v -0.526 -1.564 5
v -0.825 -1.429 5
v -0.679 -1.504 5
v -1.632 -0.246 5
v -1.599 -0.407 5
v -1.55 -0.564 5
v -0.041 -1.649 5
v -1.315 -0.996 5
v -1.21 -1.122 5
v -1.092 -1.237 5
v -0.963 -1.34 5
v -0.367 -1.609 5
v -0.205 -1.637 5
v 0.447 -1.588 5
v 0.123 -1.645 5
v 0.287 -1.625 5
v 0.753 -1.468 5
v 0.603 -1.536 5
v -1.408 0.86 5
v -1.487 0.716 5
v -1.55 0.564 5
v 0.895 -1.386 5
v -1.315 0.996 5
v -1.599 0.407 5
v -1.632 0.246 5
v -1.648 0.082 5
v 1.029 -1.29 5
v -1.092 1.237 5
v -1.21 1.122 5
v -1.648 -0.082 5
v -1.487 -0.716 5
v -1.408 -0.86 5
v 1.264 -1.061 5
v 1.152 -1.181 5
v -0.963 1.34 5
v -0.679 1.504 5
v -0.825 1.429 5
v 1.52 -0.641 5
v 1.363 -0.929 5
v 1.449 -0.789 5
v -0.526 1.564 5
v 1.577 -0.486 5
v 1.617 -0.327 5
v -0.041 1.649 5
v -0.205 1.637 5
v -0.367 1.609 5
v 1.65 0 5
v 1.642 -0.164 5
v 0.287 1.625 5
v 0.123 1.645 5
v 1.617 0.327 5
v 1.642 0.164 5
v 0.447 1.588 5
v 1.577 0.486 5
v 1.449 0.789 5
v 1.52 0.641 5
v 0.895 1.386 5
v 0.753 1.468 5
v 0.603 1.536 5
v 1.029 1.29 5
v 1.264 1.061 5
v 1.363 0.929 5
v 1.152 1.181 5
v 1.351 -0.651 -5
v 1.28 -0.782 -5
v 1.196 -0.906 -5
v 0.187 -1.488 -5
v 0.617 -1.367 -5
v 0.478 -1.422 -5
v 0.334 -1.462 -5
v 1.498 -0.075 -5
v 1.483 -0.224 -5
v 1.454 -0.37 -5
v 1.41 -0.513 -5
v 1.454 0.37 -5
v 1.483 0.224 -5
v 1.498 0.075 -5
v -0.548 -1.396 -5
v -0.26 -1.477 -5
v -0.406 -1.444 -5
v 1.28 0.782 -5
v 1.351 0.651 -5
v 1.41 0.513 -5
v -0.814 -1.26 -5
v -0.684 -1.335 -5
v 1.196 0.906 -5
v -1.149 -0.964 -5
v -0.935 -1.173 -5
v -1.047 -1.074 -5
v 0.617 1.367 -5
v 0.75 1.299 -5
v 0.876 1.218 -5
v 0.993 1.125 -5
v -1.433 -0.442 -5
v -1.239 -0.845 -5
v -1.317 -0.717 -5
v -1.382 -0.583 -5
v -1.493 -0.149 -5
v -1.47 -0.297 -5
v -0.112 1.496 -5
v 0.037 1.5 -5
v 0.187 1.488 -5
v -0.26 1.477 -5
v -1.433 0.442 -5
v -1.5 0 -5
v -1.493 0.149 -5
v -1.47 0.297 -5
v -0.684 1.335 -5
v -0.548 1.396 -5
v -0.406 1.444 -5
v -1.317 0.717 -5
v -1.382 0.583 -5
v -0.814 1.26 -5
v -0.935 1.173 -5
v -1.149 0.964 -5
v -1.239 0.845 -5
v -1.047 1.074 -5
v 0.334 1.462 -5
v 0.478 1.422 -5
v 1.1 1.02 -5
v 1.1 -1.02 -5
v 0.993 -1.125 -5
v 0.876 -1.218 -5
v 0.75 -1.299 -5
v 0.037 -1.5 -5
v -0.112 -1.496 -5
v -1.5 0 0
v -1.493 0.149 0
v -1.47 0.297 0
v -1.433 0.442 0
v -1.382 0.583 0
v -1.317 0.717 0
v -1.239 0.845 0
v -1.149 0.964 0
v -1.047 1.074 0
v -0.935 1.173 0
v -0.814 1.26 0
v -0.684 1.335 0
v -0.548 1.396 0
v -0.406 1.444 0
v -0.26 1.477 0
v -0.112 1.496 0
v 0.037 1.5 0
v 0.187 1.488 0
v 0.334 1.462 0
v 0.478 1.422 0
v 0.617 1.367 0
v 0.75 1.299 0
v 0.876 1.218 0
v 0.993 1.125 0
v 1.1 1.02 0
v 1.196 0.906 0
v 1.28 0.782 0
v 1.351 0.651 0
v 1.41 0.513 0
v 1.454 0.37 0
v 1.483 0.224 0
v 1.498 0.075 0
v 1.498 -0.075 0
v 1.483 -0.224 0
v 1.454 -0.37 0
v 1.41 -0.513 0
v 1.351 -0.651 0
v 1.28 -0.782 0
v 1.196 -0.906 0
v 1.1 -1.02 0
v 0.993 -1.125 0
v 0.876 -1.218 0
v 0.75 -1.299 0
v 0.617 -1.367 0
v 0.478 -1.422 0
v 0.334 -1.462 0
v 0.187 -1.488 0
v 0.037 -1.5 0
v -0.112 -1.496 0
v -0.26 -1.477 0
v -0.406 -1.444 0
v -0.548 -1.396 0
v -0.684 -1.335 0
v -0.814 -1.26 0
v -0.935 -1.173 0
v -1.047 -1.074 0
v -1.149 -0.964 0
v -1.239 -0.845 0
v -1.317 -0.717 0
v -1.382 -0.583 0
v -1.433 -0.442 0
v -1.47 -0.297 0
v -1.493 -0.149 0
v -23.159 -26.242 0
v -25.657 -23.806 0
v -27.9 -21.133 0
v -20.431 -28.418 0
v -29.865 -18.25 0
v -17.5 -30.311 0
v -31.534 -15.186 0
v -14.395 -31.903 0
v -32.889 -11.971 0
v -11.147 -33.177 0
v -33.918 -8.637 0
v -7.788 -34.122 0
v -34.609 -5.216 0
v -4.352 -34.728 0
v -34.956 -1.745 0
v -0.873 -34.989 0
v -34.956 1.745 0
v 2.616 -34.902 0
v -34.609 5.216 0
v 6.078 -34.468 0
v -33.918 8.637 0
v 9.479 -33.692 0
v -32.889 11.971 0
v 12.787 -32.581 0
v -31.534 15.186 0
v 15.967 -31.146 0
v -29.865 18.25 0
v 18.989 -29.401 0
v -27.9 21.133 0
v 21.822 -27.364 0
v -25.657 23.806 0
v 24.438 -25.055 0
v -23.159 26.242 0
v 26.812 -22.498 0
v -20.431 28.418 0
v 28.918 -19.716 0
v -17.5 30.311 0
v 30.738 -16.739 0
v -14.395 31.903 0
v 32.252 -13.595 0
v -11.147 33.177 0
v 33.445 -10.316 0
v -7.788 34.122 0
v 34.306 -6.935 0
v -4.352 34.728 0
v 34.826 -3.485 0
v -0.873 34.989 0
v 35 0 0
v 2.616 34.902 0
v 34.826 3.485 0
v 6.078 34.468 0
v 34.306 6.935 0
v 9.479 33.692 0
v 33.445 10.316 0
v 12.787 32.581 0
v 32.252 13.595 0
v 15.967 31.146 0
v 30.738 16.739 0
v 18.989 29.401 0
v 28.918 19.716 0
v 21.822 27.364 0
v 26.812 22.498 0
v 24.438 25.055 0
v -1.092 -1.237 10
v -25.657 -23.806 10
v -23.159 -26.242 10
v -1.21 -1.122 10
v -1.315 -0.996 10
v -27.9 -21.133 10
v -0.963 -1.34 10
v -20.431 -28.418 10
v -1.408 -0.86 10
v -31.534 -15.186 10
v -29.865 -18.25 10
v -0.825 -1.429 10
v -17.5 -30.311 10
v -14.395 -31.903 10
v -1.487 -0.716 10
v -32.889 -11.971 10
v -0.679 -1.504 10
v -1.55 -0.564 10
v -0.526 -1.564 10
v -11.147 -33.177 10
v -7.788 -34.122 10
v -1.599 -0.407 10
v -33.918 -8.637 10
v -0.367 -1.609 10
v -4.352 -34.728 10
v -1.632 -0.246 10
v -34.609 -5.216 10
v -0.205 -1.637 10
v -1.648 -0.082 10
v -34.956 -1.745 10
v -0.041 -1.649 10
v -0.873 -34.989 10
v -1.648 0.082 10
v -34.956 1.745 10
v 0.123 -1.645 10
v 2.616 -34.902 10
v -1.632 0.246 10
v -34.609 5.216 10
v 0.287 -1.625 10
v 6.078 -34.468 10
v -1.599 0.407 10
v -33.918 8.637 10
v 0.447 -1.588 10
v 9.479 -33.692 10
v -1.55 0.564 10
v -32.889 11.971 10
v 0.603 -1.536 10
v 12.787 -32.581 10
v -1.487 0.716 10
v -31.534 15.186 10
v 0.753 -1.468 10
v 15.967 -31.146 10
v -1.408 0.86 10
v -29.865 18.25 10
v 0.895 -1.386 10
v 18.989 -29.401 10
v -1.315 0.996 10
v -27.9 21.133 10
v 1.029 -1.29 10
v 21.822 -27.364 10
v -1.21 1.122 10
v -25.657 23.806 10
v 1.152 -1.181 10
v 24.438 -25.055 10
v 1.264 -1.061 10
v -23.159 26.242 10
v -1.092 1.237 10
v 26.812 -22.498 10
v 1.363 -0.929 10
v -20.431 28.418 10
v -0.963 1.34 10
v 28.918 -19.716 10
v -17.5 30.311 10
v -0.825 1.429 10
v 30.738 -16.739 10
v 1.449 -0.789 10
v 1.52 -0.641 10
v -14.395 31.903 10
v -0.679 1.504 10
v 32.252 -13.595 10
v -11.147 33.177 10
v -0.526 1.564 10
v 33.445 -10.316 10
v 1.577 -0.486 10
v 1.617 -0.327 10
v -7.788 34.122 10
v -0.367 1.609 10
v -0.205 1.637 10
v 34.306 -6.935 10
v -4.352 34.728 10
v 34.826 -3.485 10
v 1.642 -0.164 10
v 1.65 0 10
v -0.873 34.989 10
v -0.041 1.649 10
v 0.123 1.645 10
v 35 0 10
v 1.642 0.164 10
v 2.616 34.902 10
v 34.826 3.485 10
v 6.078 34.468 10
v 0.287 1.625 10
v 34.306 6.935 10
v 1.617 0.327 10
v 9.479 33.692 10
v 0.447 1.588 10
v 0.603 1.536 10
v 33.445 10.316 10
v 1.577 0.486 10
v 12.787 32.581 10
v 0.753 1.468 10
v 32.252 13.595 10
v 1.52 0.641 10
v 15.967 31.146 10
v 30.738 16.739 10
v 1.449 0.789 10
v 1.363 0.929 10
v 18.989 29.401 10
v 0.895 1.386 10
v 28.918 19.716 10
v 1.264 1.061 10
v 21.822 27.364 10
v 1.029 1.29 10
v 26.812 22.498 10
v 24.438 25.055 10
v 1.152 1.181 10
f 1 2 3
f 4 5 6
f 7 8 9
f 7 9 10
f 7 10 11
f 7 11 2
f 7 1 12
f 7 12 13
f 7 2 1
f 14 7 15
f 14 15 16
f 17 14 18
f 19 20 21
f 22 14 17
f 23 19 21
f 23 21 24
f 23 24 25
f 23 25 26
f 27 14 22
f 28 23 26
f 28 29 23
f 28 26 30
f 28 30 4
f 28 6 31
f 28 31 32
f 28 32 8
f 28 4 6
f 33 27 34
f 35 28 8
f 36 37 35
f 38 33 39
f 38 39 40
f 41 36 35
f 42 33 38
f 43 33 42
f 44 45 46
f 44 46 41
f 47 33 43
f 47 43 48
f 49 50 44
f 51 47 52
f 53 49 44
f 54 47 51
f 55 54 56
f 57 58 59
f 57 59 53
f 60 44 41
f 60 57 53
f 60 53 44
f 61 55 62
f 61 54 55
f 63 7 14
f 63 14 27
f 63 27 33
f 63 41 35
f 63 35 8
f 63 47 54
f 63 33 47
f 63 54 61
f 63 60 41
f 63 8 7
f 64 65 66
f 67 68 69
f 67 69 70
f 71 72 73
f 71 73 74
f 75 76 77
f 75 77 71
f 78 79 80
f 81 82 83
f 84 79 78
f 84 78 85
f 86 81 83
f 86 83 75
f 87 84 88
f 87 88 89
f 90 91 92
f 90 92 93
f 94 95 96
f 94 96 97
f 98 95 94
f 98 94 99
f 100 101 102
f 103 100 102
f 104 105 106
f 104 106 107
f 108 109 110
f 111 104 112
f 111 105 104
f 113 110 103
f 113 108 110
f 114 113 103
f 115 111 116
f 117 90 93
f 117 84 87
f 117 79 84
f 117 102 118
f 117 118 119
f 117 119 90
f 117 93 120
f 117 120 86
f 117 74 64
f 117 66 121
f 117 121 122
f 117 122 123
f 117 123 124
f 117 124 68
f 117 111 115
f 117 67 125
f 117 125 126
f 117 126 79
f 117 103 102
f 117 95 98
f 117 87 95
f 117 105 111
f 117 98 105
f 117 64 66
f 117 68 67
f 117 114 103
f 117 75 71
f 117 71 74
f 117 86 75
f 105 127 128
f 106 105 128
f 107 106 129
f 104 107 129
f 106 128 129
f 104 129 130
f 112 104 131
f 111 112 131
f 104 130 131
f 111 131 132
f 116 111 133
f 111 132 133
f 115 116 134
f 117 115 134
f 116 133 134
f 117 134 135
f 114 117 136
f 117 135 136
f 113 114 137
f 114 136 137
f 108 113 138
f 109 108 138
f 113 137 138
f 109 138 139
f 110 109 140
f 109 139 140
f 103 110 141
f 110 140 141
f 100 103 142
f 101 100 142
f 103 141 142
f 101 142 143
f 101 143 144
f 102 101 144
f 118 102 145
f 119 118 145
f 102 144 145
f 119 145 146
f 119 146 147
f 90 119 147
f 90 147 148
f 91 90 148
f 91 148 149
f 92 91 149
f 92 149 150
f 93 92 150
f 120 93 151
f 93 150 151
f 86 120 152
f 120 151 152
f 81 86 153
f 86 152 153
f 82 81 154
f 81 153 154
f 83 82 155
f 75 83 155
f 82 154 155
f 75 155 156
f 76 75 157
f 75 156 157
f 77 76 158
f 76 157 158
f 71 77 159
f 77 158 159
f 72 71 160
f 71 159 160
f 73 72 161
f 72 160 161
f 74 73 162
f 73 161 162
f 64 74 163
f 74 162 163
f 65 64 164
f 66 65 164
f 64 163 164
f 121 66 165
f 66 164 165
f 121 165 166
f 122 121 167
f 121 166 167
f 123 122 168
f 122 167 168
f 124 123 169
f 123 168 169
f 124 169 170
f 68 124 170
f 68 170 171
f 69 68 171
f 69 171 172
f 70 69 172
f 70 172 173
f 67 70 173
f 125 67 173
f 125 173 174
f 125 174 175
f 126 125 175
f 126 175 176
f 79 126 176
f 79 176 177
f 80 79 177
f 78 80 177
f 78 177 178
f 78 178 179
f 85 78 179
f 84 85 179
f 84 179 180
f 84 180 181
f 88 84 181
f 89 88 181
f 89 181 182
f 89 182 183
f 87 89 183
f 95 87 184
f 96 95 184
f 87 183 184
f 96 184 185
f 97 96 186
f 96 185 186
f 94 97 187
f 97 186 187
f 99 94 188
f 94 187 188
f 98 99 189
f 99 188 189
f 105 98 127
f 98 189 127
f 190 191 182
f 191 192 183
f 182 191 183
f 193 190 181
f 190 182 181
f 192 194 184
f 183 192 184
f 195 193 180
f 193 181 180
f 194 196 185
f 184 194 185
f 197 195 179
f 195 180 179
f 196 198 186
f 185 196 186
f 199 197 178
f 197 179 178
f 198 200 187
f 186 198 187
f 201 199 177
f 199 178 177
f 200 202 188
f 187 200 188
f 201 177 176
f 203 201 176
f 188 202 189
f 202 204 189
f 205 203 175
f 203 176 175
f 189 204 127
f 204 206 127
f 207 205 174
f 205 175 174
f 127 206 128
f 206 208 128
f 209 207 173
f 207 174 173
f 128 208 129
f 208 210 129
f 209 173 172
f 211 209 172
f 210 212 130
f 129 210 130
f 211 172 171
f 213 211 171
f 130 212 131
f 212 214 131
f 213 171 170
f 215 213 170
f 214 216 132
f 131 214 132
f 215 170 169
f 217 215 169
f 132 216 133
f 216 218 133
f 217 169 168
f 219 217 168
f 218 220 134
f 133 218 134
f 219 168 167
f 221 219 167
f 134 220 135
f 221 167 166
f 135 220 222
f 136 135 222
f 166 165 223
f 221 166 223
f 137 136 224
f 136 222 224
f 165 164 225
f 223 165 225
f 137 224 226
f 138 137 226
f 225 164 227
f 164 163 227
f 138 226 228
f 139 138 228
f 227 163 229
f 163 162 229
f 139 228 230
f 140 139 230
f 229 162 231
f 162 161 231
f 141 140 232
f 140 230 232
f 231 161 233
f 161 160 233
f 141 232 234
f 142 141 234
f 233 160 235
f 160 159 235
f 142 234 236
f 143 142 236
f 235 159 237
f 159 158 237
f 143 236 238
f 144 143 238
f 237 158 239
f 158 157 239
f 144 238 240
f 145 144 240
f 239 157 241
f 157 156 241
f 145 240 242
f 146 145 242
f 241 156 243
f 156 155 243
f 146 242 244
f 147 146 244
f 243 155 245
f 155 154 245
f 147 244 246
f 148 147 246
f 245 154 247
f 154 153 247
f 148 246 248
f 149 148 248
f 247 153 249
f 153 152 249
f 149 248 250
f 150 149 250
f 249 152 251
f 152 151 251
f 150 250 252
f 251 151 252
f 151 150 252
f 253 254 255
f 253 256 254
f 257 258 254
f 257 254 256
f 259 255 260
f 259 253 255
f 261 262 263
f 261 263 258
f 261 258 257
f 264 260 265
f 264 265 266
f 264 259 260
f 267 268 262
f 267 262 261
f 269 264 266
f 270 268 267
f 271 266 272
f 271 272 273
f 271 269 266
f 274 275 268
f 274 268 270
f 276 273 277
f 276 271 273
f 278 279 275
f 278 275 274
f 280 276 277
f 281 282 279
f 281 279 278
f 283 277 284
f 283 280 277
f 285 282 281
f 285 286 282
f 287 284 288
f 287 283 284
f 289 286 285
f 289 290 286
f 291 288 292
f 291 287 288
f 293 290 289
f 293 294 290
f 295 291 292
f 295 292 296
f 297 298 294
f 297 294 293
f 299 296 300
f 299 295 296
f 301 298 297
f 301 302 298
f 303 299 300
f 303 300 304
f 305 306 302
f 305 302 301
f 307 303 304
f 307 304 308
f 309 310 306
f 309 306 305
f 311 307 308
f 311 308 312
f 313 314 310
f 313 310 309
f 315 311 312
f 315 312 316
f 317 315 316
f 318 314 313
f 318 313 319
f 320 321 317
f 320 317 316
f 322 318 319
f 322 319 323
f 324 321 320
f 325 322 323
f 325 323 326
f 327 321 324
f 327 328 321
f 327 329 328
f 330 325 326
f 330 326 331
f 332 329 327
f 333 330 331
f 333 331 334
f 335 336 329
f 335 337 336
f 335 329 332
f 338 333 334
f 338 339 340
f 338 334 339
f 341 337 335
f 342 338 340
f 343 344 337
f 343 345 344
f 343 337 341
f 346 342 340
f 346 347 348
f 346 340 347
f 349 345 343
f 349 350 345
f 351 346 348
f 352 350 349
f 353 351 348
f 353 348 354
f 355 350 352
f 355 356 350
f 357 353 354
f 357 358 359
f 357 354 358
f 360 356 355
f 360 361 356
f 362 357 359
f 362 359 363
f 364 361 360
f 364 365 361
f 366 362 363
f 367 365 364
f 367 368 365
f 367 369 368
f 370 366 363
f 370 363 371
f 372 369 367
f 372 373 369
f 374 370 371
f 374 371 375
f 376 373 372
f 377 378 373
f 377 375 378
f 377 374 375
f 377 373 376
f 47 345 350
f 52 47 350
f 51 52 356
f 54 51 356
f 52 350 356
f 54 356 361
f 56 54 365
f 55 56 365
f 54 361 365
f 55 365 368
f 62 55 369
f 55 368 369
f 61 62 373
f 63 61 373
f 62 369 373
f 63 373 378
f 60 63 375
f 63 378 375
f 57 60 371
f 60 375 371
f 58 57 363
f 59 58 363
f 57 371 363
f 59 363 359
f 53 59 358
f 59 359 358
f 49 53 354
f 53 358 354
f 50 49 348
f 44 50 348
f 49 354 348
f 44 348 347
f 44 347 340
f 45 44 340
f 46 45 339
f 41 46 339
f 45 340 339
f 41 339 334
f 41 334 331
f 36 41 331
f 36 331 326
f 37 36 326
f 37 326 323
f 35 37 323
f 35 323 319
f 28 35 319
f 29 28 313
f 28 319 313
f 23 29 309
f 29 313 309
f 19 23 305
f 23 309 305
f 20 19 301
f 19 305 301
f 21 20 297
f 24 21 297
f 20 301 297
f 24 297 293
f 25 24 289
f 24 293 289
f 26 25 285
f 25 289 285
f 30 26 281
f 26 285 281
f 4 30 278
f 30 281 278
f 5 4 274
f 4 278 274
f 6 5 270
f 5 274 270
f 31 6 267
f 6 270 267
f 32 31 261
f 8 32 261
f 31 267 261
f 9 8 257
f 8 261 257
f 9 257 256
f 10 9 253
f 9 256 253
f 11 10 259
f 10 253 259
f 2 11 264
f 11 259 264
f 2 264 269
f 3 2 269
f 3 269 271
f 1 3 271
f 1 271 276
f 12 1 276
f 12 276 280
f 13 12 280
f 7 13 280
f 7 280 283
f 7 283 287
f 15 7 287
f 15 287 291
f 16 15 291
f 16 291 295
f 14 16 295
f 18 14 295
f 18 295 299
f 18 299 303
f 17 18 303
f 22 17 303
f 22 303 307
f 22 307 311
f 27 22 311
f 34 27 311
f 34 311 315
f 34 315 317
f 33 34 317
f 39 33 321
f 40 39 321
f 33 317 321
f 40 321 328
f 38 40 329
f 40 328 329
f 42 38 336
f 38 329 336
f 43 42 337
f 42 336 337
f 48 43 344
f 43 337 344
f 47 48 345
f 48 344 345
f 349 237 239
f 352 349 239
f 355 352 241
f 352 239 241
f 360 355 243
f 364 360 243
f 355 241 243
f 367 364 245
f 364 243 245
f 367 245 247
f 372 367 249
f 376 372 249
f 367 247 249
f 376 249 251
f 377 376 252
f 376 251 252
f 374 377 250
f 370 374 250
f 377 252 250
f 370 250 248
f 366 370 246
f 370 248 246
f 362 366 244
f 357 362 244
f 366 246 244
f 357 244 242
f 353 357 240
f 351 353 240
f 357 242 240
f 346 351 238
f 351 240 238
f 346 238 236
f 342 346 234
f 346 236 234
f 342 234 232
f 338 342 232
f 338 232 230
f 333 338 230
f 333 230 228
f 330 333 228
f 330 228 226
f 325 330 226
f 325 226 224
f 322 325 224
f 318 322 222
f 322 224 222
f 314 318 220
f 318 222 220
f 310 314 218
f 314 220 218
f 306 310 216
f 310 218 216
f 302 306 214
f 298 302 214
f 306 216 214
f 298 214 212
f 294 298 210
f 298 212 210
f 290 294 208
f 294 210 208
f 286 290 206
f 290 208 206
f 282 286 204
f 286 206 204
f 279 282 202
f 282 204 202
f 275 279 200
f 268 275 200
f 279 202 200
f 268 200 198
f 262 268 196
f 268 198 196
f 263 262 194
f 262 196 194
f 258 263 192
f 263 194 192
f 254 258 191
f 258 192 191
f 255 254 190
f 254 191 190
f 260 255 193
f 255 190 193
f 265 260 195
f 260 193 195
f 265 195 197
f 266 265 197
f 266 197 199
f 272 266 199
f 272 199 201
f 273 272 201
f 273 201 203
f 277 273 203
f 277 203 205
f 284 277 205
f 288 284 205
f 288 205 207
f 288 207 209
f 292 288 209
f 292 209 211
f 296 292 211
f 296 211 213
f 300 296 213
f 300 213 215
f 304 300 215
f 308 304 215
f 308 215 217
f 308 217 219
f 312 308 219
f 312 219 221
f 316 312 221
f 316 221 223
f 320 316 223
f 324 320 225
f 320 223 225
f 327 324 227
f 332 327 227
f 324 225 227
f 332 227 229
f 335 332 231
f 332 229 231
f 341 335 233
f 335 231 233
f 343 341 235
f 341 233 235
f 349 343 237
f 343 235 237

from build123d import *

# Parameters (mm, degrees)
SKETCH1_R           = 35
BOSS_EXTRUDE1_DEPTH = 10
SKETCH2_R           = 1.5
BOSS_EXTRUDE2_DEPTH = 5
SKETCH3_R           = 1.65
CUT_EXTRUDE1_DEPTH  = 5


with BuildPart() as part:
    # Sketch1 → Boss-Extrude1 (new body)
    with BuildSketch(Plane.XY):
        Circle(SKETCH1_R)
    extrude(amount=BOSS_EXTRUDE1_DEPTH)

    # Sketch2 → Boss-Extrude2 (add)
    with BuildSketch(Plane(origin=(0, 0, 0), x_dir=(-1, 0, 0), z_dir=(0, 0, -1))):
        Circle(SKETCH2_R)
    extrude(amount=BOSS_EXTRUDE2_DEPTH)

    # Sketch3 → Cut-Extrude1 (cut)
    with BuildSketch(Plane.XY.offset(10)):
        Circle(SKETCH3_R)
    extrude(amount=-CUT_EXTRUDE1_DEPTH, mode=Mode.SUBTRACT)


solid = part.part
